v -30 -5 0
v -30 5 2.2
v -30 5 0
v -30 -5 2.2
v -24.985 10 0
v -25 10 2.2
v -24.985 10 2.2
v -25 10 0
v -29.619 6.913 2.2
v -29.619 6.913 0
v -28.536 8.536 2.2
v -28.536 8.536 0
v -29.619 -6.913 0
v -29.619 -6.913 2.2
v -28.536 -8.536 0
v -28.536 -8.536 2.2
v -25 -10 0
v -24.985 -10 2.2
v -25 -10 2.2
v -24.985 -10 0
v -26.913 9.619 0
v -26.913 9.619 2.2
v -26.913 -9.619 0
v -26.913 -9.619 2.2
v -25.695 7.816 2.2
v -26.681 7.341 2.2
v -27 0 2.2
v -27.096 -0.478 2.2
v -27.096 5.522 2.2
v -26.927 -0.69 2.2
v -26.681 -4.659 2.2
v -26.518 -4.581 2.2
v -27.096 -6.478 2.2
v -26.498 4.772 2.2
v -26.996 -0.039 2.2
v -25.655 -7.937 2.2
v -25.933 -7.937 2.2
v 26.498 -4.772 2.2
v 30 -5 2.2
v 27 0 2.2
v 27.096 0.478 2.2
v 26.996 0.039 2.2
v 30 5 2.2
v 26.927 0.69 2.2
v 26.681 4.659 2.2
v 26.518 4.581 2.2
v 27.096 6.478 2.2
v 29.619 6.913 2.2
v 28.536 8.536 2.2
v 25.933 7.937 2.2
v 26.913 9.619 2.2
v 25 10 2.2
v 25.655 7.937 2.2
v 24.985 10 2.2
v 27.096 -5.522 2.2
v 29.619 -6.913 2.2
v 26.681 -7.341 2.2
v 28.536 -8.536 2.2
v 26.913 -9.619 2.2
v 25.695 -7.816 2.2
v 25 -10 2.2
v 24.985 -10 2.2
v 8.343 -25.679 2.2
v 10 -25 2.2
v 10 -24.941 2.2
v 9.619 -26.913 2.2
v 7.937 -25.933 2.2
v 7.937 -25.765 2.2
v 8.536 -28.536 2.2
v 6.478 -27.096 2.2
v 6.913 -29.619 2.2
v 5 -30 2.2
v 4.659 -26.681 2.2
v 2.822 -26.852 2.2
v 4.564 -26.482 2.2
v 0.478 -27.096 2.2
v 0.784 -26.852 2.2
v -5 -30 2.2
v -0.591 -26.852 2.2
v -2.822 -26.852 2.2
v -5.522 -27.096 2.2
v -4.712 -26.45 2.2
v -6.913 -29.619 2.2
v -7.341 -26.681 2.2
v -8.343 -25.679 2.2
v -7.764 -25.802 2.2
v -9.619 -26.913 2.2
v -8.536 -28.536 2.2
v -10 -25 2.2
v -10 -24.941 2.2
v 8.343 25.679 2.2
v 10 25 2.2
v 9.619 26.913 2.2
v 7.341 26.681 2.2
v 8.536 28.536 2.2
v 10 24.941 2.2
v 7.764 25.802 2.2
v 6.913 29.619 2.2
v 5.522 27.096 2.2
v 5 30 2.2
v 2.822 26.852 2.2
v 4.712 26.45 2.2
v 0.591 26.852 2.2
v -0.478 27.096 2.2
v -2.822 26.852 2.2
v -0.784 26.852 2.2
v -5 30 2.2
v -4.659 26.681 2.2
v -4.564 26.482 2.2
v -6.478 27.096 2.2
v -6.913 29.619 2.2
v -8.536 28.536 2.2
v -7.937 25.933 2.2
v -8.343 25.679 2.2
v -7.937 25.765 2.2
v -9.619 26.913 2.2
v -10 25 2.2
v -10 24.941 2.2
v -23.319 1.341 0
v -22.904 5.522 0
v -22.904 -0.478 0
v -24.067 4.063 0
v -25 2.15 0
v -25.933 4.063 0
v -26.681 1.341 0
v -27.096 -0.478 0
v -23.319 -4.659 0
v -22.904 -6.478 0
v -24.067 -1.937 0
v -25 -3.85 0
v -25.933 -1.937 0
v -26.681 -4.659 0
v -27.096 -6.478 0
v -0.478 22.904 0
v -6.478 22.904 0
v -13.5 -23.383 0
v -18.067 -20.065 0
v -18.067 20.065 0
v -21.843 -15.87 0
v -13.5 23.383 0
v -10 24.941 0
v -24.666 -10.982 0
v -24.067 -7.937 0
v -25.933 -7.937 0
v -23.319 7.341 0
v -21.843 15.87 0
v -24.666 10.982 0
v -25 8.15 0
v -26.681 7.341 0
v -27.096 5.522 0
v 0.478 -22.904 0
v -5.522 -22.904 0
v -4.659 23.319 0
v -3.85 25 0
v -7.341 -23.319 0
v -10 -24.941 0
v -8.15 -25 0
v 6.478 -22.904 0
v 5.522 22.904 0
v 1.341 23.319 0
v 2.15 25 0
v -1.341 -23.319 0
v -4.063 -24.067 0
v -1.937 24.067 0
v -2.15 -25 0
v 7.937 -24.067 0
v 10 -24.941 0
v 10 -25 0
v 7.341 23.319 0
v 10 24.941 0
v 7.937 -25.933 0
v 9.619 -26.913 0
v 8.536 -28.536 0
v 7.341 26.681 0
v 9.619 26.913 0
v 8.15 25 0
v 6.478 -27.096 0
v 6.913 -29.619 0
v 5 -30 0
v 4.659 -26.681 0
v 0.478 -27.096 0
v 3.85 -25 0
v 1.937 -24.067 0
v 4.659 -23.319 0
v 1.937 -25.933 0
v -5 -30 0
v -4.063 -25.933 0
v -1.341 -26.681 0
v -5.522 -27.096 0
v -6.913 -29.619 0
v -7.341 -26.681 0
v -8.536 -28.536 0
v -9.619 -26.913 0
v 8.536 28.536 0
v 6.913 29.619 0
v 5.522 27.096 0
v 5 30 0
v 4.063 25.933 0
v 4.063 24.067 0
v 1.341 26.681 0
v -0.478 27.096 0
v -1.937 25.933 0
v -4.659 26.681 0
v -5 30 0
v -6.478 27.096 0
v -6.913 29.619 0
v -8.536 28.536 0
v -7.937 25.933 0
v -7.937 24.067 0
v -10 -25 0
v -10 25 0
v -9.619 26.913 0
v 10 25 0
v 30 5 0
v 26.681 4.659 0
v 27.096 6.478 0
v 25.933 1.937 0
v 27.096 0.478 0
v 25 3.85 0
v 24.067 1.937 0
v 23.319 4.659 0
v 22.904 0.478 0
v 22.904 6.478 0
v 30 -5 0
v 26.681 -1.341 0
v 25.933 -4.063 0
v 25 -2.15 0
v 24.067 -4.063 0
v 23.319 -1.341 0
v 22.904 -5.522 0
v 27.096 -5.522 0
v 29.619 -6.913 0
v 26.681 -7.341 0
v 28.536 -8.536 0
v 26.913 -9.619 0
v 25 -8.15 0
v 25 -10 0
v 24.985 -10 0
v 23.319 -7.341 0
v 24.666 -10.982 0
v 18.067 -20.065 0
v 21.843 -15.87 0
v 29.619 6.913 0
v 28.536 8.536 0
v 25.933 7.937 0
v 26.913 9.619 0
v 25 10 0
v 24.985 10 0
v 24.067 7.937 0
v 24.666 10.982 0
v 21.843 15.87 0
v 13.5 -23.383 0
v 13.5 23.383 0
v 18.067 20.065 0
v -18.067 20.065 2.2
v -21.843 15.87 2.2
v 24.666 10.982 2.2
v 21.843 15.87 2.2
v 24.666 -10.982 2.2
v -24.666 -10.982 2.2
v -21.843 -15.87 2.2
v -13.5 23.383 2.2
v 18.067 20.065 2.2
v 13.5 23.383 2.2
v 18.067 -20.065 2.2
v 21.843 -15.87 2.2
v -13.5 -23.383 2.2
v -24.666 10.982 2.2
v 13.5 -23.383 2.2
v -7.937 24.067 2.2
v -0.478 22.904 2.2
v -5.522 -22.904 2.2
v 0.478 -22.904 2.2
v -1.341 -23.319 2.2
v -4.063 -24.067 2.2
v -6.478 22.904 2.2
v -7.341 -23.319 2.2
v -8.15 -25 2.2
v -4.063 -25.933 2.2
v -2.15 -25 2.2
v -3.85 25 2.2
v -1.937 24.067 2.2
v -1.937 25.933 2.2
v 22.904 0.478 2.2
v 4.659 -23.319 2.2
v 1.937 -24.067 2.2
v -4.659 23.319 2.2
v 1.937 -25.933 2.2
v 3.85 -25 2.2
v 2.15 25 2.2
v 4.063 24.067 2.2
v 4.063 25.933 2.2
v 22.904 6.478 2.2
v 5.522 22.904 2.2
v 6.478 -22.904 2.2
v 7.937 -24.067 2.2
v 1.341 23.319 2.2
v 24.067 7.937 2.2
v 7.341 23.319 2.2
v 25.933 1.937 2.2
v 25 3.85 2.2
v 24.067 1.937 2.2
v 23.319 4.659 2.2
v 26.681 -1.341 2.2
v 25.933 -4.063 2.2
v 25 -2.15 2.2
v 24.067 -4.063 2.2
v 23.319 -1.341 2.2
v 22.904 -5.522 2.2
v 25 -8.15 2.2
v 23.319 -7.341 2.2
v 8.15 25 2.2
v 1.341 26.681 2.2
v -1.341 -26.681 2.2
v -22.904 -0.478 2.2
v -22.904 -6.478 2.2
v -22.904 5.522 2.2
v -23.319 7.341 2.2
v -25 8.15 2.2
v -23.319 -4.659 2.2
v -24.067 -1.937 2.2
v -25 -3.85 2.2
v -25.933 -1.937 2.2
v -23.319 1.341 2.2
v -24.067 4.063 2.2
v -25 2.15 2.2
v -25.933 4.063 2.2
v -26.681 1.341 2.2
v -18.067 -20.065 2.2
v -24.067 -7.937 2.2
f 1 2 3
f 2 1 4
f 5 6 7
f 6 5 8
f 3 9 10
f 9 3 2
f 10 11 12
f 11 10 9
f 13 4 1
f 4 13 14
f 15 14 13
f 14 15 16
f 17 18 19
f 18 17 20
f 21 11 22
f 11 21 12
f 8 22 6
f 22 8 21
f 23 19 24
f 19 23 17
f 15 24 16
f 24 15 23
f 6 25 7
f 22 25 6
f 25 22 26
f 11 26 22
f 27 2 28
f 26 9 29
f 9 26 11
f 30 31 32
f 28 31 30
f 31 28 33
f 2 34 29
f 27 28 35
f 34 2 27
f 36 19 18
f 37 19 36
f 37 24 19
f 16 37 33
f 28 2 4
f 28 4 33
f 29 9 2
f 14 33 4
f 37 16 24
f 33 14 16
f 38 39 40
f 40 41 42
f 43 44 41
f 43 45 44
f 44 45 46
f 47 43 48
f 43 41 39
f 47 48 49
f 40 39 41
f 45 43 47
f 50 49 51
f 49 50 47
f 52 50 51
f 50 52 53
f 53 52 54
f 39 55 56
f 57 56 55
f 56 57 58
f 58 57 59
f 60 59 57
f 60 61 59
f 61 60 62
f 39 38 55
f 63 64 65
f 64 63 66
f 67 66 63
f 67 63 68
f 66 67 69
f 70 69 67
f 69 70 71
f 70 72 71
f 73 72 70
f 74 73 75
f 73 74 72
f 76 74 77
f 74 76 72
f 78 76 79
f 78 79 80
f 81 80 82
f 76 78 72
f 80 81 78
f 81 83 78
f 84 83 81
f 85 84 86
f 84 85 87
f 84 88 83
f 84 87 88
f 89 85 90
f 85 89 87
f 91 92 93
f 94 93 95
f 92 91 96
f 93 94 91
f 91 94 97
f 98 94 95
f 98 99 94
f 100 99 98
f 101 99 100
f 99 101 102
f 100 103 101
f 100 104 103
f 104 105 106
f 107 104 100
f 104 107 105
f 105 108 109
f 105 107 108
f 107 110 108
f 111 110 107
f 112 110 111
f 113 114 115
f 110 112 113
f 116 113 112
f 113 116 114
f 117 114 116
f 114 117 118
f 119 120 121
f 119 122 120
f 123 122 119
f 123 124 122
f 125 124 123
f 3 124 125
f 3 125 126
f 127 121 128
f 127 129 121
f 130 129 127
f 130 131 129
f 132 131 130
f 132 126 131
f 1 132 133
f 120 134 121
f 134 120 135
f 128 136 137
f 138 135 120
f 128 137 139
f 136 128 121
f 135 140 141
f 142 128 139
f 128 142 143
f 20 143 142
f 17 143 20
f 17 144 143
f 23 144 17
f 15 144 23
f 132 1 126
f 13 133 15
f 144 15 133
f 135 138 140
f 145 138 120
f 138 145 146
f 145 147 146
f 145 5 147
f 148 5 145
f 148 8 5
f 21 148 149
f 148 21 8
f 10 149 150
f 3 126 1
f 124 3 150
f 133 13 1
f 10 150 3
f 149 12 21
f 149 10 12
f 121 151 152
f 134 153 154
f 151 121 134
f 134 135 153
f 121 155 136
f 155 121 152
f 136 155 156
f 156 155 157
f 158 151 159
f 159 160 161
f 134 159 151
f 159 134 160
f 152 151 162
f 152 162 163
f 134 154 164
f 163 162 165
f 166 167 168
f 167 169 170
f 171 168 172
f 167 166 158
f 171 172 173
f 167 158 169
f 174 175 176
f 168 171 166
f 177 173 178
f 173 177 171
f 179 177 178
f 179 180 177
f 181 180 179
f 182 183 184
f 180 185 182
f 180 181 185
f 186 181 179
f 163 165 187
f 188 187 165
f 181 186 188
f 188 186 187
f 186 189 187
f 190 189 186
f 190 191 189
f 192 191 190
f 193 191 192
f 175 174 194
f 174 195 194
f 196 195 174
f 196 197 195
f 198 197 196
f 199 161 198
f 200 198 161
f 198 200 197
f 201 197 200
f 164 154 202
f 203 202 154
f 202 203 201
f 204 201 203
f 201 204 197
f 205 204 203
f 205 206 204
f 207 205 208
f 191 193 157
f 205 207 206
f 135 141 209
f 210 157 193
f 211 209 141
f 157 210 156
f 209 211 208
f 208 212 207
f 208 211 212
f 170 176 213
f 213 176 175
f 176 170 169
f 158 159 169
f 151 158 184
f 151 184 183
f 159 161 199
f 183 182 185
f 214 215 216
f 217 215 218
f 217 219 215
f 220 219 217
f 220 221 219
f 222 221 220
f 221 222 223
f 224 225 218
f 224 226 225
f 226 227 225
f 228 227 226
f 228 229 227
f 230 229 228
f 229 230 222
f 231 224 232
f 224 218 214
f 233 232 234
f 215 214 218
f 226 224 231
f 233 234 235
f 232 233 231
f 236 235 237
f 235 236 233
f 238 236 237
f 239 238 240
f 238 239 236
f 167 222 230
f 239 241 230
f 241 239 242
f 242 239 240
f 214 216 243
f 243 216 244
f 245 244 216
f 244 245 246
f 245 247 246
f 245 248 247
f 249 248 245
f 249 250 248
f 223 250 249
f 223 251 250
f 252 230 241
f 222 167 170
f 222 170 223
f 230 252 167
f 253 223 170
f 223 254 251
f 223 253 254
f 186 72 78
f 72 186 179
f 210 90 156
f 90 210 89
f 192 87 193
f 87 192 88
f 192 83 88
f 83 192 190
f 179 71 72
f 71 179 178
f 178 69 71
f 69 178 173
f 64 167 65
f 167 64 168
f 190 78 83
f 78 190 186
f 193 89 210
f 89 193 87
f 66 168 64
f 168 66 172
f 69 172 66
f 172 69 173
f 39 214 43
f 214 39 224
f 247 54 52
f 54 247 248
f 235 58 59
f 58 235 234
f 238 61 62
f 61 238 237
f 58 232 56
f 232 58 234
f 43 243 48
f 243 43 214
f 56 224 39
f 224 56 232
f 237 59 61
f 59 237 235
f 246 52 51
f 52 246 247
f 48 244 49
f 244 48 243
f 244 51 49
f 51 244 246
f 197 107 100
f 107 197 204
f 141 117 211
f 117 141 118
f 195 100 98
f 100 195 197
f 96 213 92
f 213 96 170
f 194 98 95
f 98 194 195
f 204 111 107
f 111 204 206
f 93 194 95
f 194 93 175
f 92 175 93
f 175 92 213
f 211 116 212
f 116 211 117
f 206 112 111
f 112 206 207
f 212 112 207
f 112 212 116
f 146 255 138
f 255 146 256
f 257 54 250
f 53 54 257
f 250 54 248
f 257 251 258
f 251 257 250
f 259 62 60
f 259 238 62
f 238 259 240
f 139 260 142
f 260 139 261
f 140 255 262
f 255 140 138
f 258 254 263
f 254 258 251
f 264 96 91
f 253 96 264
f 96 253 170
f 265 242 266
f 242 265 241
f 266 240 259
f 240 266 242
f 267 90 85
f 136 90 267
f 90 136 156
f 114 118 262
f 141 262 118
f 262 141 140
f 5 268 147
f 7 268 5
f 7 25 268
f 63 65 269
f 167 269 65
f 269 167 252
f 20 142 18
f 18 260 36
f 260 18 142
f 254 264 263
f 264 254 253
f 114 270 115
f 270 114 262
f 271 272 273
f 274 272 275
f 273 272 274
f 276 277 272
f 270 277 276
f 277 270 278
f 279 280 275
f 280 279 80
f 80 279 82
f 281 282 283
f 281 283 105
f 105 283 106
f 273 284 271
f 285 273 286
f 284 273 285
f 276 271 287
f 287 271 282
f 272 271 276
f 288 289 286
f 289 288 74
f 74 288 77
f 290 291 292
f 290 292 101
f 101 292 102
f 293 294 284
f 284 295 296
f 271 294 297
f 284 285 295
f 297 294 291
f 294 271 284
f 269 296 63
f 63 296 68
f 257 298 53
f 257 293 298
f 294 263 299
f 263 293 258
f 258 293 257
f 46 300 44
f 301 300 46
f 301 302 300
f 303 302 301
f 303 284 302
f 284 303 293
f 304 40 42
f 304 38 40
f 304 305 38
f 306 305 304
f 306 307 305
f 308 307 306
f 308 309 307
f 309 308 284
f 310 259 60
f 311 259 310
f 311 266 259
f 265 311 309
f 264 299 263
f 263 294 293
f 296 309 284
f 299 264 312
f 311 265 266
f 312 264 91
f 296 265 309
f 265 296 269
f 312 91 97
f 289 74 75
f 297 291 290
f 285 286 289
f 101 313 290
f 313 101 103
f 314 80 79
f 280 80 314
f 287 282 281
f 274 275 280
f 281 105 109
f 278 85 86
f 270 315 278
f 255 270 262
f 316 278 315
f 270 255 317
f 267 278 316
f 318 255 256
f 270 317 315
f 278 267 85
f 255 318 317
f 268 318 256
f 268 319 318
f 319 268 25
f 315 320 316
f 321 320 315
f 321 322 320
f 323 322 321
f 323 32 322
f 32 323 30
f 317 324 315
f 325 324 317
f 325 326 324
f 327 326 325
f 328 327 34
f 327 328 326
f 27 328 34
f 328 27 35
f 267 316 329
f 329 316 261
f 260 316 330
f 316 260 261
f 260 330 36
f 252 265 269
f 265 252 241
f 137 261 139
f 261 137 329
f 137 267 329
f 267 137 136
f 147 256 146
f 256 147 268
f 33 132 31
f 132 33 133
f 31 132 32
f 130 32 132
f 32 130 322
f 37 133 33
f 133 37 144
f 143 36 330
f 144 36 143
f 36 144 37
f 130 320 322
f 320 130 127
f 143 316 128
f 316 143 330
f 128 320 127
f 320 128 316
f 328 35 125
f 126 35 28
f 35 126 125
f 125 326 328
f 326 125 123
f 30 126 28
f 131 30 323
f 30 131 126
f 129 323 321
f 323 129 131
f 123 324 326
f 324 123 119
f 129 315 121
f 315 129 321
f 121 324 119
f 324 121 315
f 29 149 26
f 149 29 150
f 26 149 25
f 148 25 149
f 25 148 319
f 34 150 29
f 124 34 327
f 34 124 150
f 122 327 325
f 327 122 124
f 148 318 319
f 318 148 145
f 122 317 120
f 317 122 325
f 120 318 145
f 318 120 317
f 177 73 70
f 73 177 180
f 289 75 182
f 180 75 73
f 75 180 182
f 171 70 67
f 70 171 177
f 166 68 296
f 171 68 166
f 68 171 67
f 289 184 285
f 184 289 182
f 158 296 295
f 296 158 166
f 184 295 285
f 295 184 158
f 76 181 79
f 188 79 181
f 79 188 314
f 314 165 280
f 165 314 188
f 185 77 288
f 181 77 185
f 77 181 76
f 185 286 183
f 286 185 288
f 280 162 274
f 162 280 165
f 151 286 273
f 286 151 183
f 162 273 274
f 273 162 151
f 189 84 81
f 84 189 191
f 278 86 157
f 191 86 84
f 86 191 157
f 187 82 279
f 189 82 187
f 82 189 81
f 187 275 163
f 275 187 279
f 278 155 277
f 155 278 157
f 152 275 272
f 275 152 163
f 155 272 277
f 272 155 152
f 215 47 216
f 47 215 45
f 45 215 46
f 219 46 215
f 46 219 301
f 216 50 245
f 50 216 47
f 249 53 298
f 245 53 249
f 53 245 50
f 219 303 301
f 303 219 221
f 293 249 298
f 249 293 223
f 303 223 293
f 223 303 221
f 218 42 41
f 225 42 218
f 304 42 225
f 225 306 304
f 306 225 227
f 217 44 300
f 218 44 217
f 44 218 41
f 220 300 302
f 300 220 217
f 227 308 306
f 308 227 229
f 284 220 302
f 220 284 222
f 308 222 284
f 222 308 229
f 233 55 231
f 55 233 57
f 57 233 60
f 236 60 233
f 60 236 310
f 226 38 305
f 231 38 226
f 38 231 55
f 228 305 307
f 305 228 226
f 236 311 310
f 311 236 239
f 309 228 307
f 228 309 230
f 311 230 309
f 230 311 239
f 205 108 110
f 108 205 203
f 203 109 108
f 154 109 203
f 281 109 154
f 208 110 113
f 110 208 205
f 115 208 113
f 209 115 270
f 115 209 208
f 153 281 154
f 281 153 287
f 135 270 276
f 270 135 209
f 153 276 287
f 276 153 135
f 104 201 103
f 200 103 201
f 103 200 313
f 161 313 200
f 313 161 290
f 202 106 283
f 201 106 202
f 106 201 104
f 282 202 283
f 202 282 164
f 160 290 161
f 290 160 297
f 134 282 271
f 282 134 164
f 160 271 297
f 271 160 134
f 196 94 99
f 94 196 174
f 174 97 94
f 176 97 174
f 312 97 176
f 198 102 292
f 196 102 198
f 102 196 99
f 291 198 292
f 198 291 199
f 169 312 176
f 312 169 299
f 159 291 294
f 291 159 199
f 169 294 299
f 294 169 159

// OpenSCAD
// file: ../util/rounded.scad
// Do a rounded cube
module rounded(x=10, y=10, z=10, r=3, center=false) {
  if (center) {
    translate([-(x/2),-(y/2),0])
      rounded(x, y, z, r);
  } else {
    translate([r,r,0])
    minkowski() {
      cube([x-2*r,y-2*r,z/2]);
      cylinder(h=z/2, r=r);
    }
  }
}
// file: ../models/ollo.scad
// Diameter of plastic ollo holes
OlloHoles = 4.3;

// Width of Ollo "real" plastic
OlloWidth = 3;

// Distance between two ollo holes
OlloSpacing = 6;

// Do an Ollo hole on the part
module olloHole(depth=2.2)
{
    translate([0,0,-0.1])
      cylinder(depth+0.2, OlloHoles/2, OlloHoles/2);
}

// Do 3 ollo holes
module threeOllo(depth=2.2)
{
  for (xy=[[-OlloSpacing,0],[0,0],[OlloSpacing,0]]) {
    translate([xy[0], xy[1], 0])
    olloHole(depth);
  }
}

// Do a servo arm holes
module servoArm(depth=2.2)
{
    threeOllo(depth);
    rotate([0,0,90])
      threeOllo(depth);
}
// main file
use <../models/ollo.scad>;
use <../util/rounded.scad>;

module body(size=20, legs=4, width=2.2) {
    module bodyPart() {
        difference() {
            translate([-10,0,0])
                rounded(20, size, width, 5);
        }
    }

    module bodyHoles() {
        translate([0, size-5, 0]) {
            threeOllo();
        }
    }

    echo("[PART] body");
    difference() {
        union() {
            cylinder(d=size*1.8, h=width);
            for (leg=[1:legs]) {
                rotate([0,0,360*leg/legs])
                    bodyPart();
            }
        }
        for (leg=[1:legs]) {
            rotate([0,0,360*leg/legs])
                bodyHoles();
        }
    }			
}

body(size=30);
